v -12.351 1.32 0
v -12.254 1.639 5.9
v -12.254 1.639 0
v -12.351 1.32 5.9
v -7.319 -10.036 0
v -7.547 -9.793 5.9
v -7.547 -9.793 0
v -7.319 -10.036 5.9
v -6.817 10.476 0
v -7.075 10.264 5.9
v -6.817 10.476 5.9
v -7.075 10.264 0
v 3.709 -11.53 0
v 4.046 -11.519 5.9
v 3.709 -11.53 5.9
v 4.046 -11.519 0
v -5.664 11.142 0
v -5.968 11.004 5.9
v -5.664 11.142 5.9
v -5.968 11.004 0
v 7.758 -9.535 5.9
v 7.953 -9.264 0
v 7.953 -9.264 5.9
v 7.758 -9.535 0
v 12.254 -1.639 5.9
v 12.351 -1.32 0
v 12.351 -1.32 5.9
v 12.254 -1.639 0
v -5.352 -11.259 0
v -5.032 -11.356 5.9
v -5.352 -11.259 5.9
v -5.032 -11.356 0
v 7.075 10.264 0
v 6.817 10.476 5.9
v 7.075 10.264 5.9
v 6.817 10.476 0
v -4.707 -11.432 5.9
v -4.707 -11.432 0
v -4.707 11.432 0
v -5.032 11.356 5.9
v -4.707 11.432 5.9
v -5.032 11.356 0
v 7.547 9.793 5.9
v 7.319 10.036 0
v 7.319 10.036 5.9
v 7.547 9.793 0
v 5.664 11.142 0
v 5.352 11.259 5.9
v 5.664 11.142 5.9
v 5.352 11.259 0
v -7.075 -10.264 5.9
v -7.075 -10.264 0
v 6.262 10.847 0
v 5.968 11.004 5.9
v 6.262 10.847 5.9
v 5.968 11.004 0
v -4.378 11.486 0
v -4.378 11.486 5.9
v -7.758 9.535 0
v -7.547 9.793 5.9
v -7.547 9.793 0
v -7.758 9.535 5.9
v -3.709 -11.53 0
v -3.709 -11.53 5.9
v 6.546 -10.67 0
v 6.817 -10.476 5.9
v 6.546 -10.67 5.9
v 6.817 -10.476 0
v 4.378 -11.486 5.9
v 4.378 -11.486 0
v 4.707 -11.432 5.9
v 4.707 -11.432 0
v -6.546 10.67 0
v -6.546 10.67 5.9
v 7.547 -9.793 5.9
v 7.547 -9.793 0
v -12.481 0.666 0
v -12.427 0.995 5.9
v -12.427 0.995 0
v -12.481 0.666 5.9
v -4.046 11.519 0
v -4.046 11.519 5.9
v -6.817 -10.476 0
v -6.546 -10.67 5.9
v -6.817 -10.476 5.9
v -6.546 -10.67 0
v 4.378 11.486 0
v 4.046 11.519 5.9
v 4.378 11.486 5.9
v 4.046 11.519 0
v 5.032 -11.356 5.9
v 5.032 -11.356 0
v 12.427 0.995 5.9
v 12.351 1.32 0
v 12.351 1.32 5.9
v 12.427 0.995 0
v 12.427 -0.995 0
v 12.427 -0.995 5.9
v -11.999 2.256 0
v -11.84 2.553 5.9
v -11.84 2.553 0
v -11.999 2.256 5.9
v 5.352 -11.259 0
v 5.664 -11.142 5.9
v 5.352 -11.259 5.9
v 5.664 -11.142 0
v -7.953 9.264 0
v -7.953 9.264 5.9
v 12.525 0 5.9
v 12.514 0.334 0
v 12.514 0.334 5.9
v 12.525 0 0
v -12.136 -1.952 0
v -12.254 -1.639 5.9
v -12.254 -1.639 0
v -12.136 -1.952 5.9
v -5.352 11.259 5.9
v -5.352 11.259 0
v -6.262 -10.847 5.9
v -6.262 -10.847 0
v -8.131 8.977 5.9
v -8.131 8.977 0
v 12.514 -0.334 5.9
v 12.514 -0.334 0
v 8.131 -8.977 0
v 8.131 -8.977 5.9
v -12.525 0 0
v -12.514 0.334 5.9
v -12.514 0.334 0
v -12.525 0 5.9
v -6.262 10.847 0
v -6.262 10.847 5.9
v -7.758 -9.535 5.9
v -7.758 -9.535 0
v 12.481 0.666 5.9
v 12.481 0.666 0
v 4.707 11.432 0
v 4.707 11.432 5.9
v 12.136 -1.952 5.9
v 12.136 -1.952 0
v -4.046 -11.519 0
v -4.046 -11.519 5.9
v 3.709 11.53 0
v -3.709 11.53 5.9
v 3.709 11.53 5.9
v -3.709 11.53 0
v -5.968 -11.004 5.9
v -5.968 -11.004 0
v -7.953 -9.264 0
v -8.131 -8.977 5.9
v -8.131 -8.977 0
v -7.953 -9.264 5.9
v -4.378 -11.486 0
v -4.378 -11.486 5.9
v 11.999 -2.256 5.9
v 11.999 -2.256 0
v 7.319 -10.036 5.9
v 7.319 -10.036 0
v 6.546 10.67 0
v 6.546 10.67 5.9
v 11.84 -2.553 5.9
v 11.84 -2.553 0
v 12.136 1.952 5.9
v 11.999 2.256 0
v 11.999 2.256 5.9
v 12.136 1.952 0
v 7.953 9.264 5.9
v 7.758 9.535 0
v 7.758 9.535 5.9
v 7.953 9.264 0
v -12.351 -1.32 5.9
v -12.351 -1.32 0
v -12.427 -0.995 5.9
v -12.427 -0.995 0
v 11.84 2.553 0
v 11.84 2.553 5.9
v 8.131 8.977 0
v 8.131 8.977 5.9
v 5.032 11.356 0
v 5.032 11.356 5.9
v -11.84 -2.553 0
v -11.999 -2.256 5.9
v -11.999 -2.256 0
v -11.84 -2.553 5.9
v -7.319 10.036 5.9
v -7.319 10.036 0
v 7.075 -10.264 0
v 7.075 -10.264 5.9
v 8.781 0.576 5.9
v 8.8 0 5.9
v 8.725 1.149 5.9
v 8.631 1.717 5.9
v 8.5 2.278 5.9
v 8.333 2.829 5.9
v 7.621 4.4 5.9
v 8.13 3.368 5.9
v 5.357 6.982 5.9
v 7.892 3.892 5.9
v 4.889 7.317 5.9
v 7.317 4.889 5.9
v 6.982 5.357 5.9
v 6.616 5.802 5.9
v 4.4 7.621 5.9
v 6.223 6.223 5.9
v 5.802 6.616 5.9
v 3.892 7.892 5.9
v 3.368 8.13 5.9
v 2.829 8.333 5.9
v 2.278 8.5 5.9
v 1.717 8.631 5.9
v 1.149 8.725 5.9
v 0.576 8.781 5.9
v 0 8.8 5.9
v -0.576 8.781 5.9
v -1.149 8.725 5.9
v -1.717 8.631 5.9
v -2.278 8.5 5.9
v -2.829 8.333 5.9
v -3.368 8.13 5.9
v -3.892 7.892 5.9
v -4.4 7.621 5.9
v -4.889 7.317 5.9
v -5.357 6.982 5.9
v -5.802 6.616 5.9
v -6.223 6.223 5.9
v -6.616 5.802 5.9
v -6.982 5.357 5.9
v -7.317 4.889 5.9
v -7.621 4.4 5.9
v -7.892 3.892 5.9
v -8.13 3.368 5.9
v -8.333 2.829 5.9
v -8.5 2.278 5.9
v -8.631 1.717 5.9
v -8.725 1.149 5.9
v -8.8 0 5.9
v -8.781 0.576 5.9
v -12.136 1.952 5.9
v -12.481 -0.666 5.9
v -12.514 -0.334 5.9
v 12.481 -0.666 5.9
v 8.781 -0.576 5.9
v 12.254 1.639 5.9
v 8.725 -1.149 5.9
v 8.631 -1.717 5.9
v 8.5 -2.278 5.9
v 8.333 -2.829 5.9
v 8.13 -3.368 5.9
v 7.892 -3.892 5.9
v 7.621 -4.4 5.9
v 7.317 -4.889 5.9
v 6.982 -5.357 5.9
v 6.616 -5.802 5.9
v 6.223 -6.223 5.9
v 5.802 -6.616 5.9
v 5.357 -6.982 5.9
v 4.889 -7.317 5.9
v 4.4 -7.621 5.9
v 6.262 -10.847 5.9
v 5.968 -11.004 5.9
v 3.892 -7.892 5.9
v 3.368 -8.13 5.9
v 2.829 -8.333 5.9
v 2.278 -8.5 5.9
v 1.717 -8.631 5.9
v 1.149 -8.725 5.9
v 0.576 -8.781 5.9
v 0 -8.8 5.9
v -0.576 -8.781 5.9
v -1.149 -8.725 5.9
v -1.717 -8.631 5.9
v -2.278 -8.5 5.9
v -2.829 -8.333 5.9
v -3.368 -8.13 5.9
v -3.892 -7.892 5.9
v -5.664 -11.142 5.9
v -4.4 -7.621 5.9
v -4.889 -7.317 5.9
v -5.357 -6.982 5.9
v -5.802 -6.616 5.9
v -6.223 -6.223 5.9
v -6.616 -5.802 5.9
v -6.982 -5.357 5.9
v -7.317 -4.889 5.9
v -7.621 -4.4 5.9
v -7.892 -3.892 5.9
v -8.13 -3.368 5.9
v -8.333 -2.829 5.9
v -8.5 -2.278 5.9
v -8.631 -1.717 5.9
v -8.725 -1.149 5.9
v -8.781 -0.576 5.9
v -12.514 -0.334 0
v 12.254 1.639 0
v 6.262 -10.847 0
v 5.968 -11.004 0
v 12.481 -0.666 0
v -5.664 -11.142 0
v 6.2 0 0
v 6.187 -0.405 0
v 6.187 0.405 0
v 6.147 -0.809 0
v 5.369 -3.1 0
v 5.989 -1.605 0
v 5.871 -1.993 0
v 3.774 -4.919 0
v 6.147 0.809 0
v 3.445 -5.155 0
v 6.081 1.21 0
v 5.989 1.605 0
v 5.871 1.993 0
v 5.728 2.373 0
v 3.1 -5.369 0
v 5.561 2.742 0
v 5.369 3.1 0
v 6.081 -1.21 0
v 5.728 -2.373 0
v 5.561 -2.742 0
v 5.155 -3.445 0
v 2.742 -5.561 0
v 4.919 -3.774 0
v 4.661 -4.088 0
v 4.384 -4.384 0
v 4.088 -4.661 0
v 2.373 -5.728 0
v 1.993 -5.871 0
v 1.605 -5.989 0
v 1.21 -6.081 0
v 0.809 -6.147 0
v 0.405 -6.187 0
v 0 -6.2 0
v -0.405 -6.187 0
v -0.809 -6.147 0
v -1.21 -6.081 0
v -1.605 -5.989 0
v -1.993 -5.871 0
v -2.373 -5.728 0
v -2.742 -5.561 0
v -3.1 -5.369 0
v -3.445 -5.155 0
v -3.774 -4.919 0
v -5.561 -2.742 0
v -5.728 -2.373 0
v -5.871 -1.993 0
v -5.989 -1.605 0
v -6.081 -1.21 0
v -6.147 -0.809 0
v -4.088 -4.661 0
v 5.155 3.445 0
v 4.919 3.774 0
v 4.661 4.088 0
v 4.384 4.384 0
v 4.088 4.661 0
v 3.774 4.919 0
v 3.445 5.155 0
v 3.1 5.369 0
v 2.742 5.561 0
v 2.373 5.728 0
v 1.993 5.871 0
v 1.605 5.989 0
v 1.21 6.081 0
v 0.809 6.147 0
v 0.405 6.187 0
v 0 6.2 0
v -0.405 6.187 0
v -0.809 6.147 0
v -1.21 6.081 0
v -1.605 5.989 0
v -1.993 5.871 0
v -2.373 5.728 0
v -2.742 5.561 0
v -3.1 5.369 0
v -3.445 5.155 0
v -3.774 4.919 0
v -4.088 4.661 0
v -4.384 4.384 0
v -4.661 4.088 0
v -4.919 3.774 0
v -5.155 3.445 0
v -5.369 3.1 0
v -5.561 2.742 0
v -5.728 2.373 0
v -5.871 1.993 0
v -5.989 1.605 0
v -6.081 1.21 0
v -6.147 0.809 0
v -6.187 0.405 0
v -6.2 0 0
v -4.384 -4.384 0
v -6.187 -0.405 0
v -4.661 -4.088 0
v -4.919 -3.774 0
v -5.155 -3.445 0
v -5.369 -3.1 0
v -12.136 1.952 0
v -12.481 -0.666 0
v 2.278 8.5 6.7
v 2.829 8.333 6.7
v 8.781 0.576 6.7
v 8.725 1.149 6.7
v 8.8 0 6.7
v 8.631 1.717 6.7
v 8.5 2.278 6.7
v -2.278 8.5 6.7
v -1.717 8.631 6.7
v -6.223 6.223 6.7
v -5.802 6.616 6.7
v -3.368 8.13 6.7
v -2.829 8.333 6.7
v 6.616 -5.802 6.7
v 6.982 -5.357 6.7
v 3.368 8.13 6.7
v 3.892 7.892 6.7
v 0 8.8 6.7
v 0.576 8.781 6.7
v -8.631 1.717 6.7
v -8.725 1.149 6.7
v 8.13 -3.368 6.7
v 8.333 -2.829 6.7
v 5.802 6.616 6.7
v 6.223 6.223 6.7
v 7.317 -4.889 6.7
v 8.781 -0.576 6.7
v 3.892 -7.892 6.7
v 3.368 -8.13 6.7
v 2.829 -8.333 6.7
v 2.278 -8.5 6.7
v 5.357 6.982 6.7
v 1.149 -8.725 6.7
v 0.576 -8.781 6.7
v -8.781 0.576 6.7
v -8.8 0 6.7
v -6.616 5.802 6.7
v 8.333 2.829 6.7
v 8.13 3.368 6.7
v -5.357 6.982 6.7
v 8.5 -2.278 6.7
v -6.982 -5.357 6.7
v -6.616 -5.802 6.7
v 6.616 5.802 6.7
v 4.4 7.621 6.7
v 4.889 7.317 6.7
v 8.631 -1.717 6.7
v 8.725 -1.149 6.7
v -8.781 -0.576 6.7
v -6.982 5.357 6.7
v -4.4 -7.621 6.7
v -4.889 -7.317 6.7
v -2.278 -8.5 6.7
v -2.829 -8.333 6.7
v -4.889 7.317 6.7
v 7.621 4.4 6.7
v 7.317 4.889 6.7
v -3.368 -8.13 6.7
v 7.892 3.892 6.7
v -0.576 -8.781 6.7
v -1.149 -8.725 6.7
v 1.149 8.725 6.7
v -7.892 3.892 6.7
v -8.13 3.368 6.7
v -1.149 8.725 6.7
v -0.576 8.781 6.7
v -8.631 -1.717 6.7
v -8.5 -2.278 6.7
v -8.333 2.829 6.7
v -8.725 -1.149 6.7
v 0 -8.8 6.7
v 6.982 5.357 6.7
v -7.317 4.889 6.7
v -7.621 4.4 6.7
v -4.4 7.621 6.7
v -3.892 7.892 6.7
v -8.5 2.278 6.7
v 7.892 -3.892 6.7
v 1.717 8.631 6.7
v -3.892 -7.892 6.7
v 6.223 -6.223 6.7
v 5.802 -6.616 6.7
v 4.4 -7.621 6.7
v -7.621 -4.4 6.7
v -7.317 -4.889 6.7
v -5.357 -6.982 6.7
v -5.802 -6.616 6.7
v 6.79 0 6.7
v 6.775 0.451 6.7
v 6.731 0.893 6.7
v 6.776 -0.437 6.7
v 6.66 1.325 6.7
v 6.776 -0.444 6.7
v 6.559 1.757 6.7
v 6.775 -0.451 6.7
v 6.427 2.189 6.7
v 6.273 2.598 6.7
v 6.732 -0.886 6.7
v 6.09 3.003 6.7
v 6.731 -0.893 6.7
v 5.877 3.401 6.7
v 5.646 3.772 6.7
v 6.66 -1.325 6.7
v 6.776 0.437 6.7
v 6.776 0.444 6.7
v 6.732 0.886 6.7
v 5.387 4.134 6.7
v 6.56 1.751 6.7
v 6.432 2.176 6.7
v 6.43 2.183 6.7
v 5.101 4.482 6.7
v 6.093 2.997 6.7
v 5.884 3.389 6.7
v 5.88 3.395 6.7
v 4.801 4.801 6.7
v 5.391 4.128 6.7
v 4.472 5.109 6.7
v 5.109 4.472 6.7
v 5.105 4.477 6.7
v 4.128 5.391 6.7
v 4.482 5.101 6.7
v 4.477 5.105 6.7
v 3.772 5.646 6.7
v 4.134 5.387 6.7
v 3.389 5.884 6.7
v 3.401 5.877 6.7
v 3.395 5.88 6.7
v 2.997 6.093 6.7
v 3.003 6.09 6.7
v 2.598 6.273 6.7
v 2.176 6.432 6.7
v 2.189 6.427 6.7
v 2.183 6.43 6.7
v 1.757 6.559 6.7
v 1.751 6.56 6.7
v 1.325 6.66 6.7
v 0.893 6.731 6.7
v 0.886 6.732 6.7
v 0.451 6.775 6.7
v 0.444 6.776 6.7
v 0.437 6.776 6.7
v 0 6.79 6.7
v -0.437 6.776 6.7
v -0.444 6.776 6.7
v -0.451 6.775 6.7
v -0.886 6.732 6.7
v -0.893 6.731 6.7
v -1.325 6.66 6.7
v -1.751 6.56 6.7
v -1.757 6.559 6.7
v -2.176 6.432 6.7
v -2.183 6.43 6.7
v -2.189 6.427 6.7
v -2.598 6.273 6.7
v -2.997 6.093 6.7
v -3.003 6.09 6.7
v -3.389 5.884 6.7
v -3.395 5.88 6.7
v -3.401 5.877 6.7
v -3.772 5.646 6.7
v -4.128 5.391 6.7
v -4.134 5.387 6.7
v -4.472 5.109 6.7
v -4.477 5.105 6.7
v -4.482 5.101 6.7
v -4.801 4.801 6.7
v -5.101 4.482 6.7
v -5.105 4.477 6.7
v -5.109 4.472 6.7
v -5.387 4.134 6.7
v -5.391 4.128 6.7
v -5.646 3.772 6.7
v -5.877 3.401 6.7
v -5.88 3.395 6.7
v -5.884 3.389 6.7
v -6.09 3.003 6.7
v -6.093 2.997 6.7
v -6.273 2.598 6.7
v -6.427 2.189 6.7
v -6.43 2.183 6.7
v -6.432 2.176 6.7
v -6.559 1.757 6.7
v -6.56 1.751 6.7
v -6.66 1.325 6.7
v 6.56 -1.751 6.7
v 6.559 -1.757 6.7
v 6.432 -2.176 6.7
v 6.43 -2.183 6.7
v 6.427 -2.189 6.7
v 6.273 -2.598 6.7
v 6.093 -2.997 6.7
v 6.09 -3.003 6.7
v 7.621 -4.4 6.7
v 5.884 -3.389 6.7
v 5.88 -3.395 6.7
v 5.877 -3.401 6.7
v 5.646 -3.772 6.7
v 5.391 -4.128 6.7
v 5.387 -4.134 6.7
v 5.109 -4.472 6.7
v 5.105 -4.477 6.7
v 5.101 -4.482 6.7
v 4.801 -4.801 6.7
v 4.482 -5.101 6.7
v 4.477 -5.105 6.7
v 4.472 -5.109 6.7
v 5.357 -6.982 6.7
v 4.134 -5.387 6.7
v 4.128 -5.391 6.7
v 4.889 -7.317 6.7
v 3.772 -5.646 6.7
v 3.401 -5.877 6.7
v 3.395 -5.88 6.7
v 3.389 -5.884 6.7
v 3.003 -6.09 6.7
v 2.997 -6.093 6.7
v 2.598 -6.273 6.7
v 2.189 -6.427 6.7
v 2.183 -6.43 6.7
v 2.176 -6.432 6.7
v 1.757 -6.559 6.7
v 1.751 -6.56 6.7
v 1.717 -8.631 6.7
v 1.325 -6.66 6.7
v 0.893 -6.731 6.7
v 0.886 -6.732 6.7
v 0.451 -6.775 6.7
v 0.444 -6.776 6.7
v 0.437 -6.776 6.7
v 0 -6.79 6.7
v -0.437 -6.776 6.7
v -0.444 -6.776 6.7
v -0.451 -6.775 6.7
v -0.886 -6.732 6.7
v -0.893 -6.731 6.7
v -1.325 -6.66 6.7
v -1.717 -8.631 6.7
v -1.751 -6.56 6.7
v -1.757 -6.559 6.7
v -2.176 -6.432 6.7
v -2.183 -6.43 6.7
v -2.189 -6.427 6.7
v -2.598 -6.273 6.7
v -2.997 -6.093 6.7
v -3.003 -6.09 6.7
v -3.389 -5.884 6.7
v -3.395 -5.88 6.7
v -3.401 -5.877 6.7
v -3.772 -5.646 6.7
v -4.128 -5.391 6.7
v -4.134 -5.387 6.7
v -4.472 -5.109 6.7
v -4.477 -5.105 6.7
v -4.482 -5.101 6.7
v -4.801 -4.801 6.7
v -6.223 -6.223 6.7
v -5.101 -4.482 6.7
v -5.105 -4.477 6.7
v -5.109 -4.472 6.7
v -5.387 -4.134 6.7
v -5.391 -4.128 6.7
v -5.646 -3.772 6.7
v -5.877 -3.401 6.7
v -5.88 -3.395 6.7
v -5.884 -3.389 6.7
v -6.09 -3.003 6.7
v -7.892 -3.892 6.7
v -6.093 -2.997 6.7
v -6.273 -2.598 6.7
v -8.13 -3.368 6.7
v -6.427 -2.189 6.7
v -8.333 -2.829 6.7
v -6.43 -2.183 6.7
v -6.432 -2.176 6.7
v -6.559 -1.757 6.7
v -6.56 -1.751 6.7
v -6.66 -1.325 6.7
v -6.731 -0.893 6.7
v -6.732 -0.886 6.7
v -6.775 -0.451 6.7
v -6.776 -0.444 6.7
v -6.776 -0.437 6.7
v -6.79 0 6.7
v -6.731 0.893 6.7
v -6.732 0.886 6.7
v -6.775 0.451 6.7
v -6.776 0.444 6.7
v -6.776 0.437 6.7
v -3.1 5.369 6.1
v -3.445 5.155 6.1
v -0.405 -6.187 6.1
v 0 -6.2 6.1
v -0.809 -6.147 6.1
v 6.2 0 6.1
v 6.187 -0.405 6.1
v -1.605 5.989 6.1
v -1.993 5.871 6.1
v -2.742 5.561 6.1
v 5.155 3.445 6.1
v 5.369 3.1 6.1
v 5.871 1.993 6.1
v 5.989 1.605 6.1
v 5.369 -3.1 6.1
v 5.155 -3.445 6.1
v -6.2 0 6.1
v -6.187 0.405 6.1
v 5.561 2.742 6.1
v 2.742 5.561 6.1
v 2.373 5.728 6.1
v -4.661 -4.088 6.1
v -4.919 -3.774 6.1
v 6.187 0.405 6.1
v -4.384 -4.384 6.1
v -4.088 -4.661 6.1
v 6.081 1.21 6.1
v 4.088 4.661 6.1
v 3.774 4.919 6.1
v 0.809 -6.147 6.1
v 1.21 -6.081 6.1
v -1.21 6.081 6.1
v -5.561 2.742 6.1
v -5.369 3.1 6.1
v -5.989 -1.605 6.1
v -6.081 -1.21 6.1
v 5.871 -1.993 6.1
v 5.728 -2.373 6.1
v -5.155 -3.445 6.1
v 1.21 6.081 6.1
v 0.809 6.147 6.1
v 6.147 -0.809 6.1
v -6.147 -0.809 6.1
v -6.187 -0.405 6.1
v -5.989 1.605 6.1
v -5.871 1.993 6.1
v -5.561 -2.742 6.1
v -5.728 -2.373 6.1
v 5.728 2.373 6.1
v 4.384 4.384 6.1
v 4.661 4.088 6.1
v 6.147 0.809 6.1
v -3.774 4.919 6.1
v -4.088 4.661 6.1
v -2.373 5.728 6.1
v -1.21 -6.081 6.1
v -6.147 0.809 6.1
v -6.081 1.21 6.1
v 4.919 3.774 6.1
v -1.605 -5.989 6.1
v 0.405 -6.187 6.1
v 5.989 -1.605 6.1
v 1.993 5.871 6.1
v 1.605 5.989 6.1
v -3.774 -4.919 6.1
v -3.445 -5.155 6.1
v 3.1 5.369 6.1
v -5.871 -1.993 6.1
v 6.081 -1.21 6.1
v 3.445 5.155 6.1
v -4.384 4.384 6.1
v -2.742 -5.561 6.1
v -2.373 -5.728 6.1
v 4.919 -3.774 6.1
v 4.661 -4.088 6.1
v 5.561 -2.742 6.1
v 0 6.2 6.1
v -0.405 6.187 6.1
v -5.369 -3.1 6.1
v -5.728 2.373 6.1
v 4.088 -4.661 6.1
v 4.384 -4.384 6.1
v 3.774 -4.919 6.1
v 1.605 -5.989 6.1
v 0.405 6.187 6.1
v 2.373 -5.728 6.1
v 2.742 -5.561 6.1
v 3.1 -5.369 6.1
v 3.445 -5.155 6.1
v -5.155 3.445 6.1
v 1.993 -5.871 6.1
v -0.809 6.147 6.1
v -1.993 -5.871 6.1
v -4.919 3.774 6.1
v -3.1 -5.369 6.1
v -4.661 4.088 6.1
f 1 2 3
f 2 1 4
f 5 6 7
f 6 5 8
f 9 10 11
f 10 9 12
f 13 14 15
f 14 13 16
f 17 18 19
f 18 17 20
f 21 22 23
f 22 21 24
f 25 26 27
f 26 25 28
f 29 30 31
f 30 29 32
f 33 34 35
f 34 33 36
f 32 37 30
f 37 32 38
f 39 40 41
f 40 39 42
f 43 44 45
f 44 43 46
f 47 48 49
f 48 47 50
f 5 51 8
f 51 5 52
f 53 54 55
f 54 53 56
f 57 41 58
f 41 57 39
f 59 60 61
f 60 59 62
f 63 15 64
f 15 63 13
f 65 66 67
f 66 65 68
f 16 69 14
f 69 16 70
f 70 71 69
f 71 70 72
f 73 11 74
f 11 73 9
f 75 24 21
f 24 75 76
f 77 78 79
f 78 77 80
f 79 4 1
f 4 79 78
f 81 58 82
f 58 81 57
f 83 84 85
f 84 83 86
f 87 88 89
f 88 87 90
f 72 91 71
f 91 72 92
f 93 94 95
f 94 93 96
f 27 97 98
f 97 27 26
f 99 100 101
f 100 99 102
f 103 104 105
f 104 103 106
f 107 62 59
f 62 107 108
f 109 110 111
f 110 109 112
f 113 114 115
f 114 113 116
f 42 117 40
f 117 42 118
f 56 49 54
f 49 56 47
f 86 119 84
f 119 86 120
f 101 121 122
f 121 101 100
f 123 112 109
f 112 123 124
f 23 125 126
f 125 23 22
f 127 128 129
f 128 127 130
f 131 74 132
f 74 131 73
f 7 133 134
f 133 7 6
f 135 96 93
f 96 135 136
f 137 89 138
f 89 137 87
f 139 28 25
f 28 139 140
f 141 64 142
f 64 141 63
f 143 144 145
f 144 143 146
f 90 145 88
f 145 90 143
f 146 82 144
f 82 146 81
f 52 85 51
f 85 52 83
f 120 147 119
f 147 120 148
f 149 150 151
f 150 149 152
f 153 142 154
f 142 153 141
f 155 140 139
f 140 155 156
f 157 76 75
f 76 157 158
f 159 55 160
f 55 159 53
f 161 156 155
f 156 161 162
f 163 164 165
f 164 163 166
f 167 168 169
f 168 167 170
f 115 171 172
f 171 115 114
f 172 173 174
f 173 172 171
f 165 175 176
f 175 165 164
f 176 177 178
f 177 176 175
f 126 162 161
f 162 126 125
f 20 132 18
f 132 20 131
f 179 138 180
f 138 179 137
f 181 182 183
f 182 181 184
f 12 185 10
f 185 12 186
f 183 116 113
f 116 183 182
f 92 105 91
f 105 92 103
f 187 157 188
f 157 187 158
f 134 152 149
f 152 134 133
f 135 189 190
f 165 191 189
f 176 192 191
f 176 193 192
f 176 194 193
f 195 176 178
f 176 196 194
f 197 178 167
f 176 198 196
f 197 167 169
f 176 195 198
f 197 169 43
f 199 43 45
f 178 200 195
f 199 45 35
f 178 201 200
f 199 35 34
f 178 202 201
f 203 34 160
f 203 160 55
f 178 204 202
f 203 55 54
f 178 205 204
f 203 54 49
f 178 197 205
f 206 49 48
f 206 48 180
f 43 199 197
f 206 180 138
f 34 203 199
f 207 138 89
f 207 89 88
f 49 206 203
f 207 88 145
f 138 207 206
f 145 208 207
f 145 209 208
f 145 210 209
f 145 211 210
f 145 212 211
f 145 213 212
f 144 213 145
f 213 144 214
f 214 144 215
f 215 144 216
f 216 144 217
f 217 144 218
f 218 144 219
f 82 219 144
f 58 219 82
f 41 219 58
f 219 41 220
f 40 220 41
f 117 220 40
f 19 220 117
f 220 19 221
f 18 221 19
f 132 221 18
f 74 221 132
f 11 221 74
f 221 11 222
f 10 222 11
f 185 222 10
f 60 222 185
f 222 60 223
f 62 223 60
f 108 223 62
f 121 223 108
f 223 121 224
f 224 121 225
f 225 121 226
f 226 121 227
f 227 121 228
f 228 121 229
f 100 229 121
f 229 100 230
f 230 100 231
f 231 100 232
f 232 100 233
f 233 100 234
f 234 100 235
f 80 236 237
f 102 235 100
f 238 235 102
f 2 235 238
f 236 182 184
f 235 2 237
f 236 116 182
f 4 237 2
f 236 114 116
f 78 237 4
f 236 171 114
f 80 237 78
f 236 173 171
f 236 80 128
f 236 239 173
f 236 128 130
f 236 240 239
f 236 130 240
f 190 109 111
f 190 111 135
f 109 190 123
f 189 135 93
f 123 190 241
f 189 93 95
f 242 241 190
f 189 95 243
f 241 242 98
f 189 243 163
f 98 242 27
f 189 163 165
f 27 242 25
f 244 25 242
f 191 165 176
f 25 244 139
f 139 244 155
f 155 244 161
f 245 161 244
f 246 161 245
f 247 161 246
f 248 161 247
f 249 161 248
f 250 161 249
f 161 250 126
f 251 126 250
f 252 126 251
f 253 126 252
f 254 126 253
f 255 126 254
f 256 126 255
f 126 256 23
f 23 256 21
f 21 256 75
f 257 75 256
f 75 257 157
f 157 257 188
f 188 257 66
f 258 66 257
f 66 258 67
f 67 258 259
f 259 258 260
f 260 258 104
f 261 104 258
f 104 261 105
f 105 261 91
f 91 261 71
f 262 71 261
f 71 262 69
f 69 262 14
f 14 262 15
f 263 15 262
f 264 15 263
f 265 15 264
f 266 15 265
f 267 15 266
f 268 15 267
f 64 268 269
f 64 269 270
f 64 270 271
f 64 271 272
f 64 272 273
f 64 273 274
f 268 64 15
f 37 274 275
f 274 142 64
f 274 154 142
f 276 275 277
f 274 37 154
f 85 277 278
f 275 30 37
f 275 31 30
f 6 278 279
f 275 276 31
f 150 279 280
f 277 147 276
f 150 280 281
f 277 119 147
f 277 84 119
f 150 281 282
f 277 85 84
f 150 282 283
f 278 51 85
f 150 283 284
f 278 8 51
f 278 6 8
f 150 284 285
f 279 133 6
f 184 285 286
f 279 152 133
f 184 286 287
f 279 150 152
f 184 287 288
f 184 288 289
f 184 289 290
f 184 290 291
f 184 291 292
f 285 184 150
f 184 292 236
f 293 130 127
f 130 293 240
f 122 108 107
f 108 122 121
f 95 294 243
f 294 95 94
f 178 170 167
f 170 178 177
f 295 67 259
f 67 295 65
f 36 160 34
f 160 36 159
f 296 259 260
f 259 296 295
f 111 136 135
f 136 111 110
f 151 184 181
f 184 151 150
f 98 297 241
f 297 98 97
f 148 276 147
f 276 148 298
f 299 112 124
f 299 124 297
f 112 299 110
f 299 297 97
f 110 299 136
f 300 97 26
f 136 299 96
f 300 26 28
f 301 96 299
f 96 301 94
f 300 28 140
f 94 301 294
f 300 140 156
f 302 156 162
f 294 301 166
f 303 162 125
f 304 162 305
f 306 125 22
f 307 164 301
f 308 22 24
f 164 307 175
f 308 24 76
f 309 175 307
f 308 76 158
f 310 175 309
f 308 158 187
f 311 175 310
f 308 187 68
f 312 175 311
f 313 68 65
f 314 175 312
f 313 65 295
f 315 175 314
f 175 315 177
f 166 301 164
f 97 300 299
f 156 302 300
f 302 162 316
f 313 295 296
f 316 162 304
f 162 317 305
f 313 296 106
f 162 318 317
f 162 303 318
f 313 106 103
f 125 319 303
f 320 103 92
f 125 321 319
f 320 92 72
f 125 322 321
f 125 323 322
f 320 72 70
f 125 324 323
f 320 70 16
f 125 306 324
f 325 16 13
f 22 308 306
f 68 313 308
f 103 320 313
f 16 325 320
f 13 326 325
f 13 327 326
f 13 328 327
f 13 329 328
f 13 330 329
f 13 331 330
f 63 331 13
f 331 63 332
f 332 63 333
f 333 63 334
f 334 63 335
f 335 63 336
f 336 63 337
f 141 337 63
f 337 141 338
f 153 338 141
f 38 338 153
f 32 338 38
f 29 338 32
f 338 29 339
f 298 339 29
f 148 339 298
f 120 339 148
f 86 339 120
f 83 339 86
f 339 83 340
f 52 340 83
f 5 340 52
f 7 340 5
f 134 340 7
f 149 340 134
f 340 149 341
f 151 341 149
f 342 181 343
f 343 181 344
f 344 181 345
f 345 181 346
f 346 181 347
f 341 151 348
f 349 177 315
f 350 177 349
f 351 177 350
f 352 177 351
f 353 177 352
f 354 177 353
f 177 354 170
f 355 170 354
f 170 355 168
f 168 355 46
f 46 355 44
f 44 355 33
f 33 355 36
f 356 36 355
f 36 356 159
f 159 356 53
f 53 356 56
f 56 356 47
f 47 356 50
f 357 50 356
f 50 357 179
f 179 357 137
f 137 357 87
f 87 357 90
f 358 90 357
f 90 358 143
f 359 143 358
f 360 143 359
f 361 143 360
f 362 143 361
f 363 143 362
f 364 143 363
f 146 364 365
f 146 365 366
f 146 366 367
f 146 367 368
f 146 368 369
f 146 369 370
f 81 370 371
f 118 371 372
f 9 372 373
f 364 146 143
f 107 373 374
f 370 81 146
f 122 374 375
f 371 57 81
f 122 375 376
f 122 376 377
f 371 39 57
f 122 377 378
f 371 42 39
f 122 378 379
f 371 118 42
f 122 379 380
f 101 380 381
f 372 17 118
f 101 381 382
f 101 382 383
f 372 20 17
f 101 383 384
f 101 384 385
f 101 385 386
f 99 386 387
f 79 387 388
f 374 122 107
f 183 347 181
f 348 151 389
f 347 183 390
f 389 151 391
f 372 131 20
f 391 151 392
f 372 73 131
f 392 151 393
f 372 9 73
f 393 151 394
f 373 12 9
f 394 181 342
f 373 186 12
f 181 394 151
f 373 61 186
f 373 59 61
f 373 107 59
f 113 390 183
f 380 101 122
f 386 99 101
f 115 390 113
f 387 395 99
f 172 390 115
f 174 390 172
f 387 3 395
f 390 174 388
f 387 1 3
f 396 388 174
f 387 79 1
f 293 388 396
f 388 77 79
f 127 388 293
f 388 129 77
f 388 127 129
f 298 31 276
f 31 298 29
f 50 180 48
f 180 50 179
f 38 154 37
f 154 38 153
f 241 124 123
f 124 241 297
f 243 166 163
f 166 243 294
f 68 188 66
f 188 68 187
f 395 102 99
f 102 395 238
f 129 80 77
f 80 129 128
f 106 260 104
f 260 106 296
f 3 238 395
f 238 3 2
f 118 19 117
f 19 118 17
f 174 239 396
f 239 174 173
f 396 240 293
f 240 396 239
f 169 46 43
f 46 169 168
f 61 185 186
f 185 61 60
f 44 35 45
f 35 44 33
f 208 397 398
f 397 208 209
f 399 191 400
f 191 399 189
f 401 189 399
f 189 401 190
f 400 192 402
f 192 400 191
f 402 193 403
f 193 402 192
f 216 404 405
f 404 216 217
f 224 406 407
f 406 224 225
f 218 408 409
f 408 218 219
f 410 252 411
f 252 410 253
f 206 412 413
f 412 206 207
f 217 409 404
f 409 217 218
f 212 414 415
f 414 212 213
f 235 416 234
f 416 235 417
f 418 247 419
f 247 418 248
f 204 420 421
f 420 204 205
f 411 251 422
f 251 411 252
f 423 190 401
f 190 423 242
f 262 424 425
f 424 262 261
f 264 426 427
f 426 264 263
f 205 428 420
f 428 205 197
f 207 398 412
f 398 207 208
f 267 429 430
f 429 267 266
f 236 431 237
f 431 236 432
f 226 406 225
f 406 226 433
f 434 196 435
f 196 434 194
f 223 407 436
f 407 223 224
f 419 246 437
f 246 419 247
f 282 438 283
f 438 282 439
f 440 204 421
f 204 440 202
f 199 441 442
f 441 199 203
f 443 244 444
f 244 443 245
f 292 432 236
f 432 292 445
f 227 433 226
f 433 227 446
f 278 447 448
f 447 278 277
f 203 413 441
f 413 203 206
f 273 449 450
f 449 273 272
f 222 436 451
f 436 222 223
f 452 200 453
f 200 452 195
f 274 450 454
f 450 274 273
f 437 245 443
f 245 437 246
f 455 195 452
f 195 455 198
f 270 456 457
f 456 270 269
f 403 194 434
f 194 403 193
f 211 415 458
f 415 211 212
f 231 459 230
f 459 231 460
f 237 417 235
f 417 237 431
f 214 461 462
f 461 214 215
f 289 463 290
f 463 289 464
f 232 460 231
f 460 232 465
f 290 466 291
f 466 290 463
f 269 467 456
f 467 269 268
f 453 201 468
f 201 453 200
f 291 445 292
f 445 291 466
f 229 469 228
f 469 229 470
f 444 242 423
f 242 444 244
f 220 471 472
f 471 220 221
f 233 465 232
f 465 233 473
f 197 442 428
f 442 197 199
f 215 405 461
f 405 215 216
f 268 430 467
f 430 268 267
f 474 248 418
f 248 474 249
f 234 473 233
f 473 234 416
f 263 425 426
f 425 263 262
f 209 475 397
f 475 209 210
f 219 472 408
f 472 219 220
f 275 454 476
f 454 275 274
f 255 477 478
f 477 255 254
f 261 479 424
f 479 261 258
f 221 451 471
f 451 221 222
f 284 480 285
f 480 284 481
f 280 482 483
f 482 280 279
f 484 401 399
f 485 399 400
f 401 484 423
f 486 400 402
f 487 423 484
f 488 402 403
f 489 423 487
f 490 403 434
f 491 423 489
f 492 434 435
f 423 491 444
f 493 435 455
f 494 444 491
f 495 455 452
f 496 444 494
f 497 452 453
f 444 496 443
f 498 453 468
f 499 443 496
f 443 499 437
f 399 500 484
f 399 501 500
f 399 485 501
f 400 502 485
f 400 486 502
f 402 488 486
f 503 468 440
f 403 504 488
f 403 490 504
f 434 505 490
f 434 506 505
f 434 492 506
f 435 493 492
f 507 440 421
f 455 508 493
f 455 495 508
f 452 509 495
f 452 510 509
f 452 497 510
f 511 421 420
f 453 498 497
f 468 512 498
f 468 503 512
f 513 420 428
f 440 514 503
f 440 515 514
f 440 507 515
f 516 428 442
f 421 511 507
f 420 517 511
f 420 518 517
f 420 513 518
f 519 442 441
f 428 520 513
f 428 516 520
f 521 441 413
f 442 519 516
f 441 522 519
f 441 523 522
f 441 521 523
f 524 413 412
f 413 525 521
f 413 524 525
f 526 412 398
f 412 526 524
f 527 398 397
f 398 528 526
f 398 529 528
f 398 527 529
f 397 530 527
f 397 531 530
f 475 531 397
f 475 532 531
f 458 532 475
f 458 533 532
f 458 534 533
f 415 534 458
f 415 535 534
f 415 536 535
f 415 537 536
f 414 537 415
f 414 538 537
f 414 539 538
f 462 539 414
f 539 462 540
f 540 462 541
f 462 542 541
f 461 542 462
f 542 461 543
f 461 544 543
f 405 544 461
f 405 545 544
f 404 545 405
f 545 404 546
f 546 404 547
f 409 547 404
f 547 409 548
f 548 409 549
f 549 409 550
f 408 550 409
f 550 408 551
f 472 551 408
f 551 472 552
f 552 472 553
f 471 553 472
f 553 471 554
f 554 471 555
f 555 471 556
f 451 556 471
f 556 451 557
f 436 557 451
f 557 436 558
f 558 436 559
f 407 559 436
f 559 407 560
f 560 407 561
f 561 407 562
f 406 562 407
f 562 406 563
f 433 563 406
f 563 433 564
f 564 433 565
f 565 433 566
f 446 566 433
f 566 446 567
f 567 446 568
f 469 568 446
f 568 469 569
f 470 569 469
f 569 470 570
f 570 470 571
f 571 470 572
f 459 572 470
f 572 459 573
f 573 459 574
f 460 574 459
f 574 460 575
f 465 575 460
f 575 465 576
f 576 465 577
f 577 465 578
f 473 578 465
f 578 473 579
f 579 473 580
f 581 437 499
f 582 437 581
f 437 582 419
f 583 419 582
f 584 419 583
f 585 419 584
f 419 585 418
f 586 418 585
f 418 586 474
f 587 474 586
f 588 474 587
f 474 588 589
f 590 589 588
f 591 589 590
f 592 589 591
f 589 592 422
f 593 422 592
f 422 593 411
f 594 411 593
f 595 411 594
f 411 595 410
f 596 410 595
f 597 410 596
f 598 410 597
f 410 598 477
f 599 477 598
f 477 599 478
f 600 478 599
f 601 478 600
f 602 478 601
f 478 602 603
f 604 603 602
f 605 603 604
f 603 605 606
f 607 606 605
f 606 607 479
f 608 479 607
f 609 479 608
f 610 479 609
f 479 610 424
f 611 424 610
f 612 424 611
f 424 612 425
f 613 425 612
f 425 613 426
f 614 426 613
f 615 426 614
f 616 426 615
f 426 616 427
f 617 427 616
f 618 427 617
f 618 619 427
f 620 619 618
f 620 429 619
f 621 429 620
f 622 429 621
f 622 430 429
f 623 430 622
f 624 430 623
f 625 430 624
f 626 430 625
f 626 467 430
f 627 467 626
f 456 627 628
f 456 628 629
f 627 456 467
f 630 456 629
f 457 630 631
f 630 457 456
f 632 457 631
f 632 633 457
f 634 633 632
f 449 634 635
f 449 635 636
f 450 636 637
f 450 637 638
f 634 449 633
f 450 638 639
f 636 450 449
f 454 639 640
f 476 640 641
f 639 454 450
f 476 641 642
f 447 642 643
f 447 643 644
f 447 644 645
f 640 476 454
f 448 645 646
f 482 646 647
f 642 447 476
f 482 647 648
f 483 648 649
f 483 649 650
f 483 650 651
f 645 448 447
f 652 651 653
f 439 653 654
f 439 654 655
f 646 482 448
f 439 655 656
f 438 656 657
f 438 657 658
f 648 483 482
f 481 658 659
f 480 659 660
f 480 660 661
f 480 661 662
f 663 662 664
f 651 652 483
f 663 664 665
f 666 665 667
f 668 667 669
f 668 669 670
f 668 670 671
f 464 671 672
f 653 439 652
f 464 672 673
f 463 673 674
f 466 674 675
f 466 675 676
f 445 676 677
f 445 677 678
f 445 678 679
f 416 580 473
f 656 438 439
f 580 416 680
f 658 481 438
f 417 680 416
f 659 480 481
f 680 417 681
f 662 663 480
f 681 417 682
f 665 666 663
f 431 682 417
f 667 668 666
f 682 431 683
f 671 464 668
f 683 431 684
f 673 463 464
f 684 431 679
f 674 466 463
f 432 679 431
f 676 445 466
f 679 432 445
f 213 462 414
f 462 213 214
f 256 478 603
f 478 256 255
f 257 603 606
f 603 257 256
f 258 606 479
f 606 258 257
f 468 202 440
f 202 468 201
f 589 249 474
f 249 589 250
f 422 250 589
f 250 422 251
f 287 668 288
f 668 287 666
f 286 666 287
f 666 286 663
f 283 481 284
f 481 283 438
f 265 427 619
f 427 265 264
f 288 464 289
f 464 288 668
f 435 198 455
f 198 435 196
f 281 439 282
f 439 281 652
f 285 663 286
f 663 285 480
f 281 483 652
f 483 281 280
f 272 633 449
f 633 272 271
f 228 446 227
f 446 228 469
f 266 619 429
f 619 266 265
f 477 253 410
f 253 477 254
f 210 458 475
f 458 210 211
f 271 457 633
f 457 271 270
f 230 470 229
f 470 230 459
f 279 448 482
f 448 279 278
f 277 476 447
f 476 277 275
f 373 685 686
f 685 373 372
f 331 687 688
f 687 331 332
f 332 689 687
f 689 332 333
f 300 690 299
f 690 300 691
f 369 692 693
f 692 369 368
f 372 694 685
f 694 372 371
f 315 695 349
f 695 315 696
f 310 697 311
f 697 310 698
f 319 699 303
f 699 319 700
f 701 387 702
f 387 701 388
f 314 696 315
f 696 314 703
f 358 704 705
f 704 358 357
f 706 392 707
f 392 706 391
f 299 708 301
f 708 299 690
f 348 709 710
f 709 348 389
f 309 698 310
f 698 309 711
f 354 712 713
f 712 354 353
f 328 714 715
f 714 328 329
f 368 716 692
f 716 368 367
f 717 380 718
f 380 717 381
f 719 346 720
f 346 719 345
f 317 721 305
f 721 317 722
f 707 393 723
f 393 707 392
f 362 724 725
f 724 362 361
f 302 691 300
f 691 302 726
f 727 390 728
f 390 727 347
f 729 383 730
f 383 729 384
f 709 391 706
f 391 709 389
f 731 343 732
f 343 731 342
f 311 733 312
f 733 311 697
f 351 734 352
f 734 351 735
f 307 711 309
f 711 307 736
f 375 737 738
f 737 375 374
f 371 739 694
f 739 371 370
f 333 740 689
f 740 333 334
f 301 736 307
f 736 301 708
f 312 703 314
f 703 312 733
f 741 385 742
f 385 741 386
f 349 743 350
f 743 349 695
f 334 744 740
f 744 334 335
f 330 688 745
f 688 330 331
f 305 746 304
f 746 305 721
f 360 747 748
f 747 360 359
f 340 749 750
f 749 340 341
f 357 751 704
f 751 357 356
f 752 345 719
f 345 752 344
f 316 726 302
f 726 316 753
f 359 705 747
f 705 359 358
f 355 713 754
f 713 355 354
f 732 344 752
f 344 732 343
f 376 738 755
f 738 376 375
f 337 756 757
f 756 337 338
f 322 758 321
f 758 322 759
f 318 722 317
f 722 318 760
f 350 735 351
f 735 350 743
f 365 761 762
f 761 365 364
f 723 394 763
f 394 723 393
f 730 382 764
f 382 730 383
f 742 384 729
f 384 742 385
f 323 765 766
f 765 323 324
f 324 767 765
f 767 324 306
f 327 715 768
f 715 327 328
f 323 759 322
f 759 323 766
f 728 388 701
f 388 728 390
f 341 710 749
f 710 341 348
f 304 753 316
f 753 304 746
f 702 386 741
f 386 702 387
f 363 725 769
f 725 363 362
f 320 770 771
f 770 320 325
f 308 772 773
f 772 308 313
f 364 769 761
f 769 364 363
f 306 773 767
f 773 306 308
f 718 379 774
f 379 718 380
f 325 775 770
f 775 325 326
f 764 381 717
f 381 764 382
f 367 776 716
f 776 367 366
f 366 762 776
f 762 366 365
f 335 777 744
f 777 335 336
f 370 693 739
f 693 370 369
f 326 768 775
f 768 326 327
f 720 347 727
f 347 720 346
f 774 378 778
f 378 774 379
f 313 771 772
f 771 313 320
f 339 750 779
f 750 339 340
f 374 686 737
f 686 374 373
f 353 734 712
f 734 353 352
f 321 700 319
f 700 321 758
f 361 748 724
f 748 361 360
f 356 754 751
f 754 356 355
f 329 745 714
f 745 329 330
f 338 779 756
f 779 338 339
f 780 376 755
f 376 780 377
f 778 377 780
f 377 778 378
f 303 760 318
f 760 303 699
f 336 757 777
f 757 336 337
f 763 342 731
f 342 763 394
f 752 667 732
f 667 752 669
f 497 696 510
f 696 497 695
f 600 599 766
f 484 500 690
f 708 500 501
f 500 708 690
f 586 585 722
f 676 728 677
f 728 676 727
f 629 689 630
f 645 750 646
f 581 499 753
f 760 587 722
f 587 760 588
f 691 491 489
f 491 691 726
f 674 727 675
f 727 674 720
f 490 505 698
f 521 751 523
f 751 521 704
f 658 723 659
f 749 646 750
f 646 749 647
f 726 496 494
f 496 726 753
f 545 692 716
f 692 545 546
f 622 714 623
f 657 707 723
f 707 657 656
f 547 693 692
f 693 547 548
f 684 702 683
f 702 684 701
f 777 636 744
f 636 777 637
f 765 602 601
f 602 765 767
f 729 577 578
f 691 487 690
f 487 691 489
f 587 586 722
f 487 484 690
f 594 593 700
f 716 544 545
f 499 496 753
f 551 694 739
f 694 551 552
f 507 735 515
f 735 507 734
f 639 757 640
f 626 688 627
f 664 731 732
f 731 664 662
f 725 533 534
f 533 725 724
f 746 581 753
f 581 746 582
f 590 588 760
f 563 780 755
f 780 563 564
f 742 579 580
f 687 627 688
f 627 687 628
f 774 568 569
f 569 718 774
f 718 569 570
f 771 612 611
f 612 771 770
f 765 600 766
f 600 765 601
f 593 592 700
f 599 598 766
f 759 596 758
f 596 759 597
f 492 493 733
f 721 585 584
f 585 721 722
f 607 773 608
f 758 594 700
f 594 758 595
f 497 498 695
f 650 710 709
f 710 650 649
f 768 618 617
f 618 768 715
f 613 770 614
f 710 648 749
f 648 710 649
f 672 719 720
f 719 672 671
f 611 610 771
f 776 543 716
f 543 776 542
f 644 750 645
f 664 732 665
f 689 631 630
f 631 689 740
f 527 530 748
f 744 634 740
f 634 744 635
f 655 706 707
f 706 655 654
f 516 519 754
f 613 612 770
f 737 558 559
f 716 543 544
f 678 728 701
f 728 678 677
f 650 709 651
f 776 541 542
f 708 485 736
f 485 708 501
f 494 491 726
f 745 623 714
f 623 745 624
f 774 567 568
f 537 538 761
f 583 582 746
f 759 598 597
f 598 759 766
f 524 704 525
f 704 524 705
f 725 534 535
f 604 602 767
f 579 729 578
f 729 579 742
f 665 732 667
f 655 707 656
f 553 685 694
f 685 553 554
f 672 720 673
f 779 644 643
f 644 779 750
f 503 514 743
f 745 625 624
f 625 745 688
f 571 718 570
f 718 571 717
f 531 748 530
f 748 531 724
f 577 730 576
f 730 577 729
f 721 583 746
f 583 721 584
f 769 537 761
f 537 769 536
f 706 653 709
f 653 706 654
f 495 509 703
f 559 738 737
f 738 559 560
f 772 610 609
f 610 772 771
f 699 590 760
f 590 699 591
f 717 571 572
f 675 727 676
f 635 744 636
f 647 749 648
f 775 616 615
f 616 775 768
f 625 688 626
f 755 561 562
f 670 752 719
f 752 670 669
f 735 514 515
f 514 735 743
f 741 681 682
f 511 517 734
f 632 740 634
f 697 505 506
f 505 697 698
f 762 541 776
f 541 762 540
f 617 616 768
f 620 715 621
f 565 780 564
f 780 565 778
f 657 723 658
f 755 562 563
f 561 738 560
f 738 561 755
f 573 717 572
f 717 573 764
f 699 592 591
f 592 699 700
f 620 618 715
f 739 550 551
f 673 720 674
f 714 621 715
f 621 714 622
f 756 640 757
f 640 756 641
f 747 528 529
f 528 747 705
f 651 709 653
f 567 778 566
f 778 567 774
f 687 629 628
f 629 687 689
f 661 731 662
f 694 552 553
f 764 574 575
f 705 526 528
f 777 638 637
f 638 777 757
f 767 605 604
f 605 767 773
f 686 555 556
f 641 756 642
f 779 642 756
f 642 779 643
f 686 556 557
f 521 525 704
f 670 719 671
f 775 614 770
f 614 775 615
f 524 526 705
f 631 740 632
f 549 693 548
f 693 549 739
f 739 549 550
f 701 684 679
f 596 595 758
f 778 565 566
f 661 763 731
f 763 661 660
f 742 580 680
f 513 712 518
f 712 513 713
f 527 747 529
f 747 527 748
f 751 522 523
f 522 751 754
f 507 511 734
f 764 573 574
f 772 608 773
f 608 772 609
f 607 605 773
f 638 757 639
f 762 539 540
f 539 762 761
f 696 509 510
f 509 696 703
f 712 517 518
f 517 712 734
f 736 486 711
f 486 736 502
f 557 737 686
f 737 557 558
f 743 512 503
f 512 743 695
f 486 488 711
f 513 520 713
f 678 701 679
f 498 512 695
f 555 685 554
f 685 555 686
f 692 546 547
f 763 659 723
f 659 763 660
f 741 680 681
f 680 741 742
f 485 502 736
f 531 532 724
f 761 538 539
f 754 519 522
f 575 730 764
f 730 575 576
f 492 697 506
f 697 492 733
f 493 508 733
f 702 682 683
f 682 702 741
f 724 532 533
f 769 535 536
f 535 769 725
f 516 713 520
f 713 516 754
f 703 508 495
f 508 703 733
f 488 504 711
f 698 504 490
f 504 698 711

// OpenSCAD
// =====================================================================
//  Adapter for a 12 mm button (M12x0.75) in the REDUX faceplate
//  Fits in the hexagonal counterbore behind the button hole and is glued.
//  Dimensions taken from the faceplate file:
//   - counterbore: rounded hexagon, 23.46 mm across flats, corner
//     radius about 5 mm, 6.0 mm deep
//   - front hole: 18.0 mm diameter in a 0.8 mm skin
//  The button goes in from the front, the nut tightens from behind.
//  Print with the large face (the back) on the bed, no supports.
// =====================================================================

clearance    = 0.20;   // gap per side between adapter and counterbore (glue)
flats        = 23.46;  // counterbore: distance across flats
corner_r     = 5.3;    // counterbore: corner radius
depth        = 6.0;    // counterbore: depth
front_hole   = 18.0;   // hole in the front skin
skin         = 0.8;    // front skin thickness
button_hole  = 12.4;   // clearance for the button's M12 thread
recess       = 0.1;    // how far it sits below both faces
$fn = 96;

module rounded_hexagon(af, rc) {
    // hexagon with "af" across flats and corners of radius "rc"
    offset(r=rc) circle(r=(af/2 - rc)/cos(30), $fn=6);
}

module adapter() {
    difference() {
        union() {
            // body inside the counterbore (from the back to its bottom)
            linear_extrude(depth - recess)
                offset(delta=-clearance) rounded_hexagon(flats, corner_r);
            // ring that fills the front hole (flush with the front)
            translate([0, 0, depth - recess - 0.01])
                cylinder(d=front_hole - 2*clearance, h=skin + 0.01);
        }
        translate([0, 0, -1]) cylinder(d=button_hole, h=20);
        // lead-in chamfer from the front, so the thread does not catch
        translate([0, 0, depth - recess + skin - 0.6]) cylinder(d1=button_hole, d2=button_hole + 1.2, h=0.61);
    }
}

adapter();
echo(str("Total thickness: ", depth - recess + skin, " mm (the button accepts up to 8 mm)"));
